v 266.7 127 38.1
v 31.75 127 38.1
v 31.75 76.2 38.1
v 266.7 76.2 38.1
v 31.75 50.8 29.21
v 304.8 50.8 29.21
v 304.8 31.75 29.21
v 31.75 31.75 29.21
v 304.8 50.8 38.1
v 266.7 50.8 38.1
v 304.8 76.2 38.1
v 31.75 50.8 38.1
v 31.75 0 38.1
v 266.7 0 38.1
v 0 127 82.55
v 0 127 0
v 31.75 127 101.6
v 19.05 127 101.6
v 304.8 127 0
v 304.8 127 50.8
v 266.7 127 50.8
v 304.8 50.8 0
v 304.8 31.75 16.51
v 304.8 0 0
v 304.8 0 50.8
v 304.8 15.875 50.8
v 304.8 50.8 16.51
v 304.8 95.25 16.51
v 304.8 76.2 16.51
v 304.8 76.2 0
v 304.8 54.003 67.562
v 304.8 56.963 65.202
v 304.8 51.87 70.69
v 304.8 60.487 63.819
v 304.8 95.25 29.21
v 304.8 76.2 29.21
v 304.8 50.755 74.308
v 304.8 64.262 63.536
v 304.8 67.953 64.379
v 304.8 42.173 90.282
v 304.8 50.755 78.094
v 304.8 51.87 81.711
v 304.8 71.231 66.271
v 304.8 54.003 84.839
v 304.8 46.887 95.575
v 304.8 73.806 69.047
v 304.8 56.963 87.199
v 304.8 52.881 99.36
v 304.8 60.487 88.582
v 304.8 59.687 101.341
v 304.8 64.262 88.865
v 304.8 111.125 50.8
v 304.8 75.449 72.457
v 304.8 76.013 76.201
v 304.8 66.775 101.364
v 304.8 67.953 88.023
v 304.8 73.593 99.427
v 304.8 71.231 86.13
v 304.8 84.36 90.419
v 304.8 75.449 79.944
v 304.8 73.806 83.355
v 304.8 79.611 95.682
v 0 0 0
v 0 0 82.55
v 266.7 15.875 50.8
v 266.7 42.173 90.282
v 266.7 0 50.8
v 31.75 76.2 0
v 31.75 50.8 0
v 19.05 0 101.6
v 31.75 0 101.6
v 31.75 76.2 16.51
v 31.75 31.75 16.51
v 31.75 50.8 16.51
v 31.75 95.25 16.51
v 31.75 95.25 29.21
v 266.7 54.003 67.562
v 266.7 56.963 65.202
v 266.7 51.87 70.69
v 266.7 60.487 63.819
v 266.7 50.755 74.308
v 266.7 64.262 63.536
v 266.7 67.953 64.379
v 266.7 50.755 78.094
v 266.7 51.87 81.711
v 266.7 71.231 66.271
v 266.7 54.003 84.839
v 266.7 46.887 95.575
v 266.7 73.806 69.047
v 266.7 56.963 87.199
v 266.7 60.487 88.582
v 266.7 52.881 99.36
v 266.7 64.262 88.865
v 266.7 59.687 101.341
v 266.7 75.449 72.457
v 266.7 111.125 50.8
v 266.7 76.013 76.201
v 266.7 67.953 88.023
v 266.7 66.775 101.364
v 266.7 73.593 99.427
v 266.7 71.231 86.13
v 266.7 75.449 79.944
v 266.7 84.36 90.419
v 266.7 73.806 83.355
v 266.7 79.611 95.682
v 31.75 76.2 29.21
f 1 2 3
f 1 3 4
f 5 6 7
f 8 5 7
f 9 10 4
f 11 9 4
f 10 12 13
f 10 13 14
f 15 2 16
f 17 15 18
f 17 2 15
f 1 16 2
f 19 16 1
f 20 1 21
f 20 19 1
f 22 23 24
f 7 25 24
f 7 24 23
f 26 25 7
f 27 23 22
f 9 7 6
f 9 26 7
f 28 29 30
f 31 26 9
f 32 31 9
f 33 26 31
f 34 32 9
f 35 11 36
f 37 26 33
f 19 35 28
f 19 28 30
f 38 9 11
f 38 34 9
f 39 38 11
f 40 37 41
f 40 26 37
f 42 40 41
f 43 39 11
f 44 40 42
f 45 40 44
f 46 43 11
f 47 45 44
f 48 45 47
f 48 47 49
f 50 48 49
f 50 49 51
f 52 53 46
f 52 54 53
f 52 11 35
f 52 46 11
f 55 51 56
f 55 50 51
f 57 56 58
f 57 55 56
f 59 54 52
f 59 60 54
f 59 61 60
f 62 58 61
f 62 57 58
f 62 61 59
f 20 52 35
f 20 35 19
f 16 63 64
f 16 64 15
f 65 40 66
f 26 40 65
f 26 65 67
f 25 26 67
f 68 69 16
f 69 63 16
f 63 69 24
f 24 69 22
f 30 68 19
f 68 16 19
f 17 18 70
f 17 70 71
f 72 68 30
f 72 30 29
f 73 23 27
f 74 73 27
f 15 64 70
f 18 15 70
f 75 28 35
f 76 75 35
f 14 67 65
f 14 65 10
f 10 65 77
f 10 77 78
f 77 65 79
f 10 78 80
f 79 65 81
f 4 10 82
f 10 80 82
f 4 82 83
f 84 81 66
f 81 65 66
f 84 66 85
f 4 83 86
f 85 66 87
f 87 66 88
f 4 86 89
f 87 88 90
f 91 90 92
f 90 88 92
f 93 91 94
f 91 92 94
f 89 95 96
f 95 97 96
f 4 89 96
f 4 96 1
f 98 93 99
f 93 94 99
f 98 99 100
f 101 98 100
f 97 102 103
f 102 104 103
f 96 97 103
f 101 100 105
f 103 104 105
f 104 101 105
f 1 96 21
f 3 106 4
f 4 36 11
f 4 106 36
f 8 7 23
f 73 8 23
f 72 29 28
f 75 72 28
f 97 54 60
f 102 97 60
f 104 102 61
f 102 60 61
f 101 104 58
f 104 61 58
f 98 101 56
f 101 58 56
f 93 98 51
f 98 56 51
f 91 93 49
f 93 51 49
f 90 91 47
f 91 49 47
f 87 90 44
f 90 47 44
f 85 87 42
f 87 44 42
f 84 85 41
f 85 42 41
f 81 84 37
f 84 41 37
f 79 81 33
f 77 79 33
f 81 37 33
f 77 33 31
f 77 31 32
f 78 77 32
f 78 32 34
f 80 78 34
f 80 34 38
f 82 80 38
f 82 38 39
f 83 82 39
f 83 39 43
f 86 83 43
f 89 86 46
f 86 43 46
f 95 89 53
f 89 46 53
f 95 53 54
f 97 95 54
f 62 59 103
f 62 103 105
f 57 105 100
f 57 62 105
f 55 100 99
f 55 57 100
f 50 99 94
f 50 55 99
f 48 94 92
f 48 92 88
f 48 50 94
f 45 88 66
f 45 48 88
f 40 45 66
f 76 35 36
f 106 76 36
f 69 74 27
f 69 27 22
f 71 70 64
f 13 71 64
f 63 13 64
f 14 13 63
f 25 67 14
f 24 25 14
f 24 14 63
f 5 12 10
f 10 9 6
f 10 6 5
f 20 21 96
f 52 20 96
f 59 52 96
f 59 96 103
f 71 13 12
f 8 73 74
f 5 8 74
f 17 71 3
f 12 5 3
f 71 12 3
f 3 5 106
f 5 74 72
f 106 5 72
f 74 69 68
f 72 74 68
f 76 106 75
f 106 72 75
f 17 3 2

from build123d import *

# Parameters (mm, degrees)
F0_W      = 304.8
F0_H      = 127
F1_DEPTH  = 38.1
F2_W      = 31.75
F2_H      = 127
F3_DEPTH  = 63.5
F5_DEPTH  = 127.001
F7_DEPTH  = 273.05
F9_DEPTH  = 38.1
F10_R     = 12.7
F11_DEPTH = 38.1


with BuildPart() as f1:
    # F0 (on Top) → F1 (new body)
    with BuildSketch(Plane.XY):
        with Locations((152.4, 63.5)):
            Rectangle(F0_W, F0_H)
    extrude(amount=F1_DEPTH)

    # F2 (on face) → F3 (join)
    with BuildSketch(Plane.XY.offset(38.1)):
        with Locations((15.875, 63.5)):
            Rectangle(F2_W, F2_H)
    extrude(amount=F3_DEPTH)

    # F4 (on face) → F5 (cut, through all)
    with BuildSketch(Plane.XZ):
        Polygon((19.05, 101.6), (0, 101.6), (0, 82.55), align=None)
    extrude(amount=-F5_DEPTH, mode=Mode.SUBTRACT)

    # F6 (on face) → F7 (cut)
    with BuildSketch(Plane.YZ.offset(304.8)):
        Polygon((50.8, 16.51), (50.8, 0), (76.2, 0), (76.2, 16.51), (95.25, 16.51), (95.25, 29.21), (76.2, 29.21), (76.2, 38.1), (50.8, 38.1), (50.8, 29.21), (31.75, 29.21), (31.75, 16.51), align=None)
    extrude(amount=-F7_DEPTH, mode=Mode.SUBTRACT)

    # F8 (on face) → F9 (join)
    with BuildSketch(Plane.YZ.offset(304.8)):
        with BuildLine():
            Line((0, 50.8), (0, 38.1))
            Line((0, 38.1), (127, 38.1))
            Line((127, 38.1), (127, 50.8))
            Line((127, 50.8), (111.125, 50.8))
            Line((111.125, 50.8), (84.360147, 90.419272))
            ThreePointArc((84.360147, 90.419272), (63.22985, 101.600555), (42.17301, 90.281542))
            Line((42.17301, 90.281542), (15.875, 50.8))
            Line((15.875, 50.8), (0, 50.8))
        make_face()
    extrude(amount=-F9_DEPTH)

    # F10 (on face) → F11 (cut)
    with BuildSketch(Plane.YZ.offset(304.8)):
        with Locations((63.312774, 76.20069)):
            Circle(F10_R)
    extrude(amount=-F11_DEPTH, mode=Mode.SUBTRACT)


solid = f1.part
